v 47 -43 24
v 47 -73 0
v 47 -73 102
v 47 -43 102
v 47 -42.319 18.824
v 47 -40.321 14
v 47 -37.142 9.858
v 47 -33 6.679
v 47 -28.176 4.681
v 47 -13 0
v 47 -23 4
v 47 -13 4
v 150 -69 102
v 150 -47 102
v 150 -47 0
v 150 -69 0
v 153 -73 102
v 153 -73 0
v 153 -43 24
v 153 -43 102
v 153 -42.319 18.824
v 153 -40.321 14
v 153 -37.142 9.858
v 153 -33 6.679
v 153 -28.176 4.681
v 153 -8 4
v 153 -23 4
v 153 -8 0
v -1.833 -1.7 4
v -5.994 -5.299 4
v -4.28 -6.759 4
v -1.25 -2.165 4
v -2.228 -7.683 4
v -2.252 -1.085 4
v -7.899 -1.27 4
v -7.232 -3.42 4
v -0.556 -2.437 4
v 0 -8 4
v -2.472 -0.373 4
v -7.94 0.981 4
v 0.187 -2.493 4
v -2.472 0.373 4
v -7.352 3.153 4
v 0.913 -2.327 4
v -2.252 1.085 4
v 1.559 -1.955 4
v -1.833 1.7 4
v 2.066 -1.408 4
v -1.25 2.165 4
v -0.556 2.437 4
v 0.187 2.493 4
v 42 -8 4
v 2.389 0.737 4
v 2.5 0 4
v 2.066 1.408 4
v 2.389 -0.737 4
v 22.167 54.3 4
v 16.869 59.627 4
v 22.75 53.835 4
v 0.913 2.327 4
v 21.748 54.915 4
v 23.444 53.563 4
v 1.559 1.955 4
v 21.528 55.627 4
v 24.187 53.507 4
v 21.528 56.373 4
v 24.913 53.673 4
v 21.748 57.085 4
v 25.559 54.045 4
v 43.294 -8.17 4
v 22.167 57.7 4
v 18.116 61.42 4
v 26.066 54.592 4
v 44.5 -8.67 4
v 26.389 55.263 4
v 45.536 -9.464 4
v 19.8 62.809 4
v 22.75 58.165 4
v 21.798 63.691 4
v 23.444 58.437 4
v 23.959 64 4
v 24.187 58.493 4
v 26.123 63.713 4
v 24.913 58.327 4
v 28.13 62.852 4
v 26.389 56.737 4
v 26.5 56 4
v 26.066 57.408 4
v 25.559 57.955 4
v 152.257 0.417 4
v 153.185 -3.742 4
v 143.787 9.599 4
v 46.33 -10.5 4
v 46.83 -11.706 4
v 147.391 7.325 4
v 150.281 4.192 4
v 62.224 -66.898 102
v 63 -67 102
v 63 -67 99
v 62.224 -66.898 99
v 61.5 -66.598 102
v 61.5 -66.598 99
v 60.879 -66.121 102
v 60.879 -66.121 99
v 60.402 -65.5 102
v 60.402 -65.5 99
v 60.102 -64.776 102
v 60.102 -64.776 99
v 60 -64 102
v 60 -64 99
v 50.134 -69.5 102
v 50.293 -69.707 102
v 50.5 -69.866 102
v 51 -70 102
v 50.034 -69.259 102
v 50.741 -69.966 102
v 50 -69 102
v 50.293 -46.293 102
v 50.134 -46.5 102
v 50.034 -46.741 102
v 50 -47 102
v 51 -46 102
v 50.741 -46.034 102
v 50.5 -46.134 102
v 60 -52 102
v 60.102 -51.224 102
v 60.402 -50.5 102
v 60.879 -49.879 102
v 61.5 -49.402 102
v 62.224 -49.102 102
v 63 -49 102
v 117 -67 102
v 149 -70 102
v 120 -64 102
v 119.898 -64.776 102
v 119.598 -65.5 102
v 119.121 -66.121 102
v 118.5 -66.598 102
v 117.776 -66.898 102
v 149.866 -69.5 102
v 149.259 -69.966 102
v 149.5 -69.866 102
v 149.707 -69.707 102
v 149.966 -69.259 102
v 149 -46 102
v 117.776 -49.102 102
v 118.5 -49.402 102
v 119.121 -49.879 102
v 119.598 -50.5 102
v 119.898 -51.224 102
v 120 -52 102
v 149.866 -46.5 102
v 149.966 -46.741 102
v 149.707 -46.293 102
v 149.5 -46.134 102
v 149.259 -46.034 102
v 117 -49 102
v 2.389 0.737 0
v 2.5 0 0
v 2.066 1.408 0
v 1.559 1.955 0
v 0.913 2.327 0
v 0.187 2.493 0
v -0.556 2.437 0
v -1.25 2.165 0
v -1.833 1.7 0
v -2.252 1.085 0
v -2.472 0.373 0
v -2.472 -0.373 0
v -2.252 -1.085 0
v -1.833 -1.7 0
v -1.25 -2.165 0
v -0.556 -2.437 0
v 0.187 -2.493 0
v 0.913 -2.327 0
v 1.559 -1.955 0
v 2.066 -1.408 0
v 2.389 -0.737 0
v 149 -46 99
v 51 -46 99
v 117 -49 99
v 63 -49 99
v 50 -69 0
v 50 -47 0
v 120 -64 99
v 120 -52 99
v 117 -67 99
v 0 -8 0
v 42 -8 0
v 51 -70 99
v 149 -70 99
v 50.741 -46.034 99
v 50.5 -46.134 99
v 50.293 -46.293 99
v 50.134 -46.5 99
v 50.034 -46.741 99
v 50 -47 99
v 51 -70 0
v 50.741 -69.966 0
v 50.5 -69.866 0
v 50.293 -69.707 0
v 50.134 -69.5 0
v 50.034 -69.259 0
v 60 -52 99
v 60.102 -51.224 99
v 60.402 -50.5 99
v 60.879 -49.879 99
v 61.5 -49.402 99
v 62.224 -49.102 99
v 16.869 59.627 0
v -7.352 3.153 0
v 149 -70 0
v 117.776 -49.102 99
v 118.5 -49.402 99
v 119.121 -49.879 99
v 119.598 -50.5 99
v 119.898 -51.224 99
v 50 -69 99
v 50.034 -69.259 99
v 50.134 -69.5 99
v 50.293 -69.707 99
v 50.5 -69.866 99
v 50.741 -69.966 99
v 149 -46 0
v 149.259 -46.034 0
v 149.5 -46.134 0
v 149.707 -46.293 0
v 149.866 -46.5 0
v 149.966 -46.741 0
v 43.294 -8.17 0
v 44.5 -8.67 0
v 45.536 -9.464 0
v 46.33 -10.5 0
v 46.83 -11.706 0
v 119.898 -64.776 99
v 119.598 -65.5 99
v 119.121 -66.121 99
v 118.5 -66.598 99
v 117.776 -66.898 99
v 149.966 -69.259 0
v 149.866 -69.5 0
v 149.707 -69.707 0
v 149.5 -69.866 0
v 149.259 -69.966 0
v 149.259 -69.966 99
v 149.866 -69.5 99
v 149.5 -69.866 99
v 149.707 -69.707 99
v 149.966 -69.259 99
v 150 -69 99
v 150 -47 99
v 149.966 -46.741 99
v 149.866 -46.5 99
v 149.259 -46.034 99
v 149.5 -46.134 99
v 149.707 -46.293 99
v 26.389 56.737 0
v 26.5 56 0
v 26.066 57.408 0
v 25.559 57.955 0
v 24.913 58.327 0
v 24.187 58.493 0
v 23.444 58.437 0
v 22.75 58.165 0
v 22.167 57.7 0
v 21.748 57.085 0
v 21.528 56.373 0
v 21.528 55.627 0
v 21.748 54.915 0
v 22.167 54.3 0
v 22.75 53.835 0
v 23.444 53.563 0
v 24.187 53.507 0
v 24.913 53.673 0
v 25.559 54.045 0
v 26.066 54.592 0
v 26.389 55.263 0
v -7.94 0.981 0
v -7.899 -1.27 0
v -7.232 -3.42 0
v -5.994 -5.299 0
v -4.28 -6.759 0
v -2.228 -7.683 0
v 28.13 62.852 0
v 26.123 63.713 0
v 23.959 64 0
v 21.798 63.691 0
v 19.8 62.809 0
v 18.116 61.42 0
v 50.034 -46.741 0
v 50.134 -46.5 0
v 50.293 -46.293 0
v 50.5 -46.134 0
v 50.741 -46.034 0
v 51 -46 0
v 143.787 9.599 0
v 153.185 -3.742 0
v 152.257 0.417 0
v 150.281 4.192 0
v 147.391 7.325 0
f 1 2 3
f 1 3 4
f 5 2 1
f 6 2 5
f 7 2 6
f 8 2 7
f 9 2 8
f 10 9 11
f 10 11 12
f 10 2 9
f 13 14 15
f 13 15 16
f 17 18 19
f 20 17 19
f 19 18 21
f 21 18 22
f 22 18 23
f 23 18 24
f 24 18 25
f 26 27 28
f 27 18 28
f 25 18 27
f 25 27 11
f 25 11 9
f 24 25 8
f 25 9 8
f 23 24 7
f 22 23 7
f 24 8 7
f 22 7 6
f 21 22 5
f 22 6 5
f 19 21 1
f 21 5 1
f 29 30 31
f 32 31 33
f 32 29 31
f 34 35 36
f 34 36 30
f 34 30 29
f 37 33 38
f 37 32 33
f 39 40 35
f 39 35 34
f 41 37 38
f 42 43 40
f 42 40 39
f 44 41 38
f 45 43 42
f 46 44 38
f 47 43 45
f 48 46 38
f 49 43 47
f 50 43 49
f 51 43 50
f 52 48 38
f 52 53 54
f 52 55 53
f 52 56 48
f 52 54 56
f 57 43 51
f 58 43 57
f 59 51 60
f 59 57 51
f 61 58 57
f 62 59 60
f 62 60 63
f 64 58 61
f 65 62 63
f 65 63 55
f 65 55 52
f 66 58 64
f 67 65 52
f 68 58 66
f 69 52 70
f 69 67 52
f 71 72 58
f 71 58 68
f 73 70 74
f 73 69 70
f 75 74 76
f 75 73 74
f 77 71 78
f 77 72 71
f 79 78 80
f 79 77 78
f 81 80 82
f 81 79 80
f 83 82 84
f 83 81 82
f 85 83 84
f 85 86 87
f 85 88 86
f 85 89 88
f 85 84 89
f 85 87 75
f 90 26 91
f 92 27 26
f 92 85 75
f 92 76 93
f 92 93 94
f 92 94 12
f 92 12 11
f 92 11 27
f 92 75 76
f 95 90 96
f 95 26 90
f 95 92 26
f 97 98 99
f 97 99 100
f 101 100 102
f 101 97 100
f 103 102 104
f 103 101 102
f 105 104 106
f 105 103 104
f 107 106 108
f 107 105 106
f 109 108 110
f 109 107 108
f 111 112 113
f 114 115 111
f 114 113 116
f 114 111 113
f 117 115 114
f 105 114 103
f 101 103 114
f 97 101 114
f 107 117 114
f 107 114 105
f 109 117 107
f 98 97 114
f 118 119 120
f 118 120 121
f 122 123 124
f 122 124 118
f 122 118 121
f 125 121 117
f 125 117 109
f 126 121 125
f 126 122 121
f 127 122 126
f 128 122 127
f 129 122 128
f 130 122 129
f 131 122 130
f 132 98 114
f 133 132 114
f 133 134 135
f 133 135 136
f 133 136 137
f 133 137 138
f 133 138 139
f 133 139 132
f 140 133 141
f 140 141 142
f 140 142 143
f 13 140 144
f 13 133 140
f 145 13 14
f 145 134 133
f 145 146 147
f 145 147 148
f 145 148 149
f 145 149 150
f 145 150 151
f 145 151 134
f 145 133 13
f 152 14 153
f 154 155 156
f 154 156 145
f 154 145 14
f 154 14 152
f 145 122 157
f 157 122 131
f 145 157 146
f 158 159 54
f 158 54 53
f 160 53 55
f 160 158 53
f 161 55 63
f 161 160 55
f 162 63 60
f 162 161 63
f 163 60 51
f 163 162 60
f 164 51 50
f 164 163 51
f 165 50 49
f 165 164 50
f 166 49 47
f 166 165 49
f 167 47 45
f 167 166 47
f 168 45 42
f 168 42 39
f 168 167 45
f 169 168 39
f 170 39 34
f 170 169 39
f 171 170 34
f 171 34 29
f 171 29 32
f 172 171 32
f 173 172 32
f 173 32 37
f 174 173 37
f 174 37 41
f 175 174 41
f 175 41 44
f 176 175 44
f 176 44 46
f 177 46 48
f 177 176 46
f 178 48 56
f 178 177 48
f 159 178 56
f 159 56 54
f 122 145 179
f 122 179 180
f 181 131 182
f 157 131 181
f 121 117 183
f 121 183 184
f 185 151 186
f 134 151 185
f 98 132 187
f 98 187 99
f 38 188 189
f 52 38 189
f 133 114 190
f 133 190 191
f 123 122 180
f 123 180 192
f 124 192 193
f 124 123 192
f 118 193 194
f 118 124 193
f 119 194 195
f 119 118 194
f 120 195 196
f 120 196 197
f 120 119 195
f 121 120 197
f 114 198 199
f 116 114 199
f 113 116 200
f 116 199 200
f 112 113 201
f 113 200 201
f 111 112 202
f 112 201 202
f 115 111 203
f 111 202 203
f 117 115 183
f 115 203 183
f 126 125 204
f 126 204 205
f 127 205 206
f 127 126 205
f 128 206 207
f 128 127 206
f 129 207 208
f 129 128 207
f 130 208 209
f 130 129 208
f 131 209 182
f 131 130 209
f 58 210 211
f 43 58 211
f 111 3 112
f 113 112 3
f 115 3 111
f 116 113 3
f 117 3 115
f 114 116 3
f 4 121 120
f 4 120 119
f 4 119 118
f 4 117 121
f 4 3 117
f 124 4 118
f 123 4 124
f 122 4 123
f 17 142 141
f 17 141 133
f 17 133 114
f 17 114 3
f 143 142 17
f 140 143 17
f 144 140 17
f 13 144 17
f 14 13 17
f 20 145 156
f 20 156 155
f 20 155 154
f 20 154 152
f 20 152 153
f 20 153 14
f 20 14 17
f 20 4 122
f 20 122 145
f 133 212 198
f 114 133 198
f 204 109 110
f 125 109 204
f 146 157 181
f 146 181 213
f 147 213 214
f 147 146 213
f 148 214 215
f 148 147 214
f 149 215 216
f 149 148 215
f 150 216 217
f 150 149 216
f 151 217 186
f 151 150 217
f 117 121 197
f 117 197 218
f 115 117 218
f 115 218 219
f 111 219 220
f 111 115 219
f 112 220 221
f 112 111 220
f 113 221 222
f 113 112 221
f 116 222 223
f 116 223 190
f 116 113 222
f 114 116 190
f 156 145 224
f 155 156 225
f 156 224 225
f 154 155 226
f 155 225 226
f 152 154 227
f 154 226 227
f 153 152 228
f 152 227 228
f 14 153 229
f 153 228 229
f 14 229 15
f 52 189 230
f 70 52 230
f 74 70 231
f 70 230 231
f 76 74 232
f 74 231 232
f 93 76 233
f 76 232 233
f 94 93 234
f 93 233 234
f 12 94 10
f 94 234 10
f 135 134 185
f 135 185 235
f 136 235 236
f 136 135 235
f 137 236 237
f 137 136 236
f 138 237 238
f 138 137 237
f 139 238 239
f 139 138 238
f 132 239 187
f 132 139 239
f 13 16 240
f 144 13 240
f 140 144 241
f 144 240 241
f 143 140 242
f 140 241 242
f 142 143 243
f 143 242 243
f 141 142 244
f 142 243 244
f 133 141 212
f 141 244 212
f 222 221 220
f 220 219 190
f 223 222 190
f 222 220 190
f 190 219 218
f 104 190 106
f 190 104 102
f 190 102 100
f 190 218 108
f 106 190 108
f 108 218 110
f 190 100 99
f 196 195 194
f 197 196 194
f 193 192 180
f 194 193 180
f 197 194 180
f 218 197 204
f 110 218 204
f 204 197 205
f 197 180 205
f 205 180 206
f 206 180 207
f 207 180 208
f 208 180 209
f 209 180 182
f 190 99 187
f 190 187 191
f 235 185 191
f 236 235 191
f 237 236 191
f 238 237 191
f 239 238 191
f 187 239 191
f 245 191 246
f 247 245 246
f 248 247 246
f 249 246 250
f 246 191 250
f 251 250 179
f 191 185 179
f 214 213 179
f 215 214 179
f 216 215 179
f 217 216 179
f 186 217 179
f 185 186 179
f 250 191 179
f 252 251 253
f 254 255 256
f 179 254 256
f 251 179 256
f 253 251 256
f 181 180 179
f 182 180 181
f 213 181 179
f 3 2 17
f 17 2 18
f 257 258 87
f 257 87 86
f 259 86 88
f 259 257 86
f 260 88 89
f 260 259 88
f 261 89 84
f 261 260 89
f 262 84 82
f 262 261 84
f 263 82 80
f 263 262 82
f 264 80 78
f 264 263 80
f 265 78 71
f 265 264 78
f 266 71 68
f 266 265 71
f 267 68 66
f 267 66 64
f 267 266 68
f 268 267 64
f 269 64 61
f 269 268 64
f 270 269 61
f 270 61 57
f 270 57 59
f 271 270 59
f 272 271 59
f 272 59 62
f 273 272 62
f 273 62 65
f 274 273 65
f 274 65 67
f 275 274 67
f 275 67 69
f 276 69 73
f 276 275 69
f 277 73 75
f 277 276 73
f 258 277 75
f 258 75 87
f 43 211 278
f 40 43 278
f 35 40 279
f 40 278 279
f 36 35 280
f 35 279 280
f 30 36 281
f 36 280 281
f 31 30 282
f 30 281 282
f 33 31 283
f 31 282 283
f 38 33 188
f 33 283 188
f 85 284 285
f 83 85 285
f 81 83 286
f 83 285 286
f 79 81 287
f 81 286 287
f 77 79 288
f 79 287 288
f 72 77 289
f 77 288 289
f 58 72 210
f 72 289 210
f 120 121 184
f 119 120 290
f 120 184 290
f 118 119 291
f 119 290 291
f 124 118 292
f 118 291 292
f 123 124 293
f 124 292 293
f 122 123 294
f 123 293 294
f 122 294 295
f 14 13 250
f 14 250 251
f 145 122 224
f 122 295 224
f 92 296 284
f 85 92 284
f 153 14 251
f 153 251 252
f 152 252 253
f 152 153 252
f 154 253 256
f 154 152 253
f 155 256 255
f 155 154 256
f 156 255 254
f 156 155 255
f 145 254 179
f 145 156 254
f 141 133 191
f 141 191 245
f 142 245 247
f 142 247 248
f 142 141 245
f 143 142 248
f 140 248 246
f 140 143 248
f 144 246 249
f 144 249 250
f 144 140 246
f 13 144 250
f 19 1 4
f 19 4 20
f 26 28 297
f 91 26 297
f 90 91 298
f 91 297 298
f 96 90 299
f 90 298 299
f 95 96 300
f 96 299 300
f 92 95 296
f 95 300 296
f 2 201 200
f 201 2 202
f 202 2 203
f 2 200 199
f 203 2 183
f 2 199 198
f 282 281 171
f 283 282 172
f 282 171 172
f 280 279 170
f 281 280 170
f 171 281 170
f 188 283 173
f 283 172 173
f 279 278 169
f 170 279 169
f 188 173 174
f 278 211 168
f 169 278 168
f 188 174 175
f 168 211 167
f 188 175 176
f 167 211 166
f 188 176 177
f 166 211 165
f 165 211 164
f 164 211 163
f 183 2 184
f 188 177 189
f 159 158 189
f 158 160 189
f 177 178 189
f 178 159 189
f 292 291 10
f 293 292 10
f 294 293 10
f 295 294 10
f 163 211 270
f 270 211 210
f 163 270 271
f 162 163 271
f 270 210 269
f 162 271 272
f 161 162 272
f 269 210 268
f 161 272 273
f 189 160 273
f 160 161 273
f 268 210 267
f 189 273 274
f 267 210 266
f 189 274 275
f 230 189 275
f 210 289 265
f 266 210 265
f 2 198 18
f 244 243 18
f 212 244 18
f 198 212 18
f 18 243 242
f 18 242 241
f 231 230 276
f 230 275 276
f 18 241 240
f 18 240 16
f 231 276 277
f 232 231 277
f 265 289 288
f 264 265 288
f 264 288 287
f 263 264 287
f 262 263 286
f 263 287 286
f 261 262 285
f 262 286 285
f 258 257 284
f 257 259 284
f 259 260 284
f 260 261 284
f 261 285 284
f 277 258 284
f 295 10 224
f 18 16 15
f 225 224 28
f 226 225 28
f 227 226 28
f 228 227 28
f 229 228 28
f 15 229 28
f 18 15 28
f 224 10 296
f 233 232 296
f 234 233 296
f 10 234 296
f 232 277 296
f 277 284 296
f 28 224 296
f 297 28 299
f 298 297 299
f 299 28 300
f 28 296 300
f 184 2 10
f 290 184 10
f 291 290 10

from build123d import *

# Parameters (mm, degrees)
F0_R      = 2.5
F1_DEPTH  = 4
F3_DEPTH  = 4.001
F2_W      = 106
F2_H      = 30
F4_DEPTH  = 77
F4_FACE_W = 106
F4_FACE_H = 30
F5_DEPTH  = 25
F7_DEPTH  = 3
F8_R      = 20


with BuildPart() as f1:
    # F0 (on Top) → F1 (new body)
    with BuildSketch(Plane.XY):
        with BuildLine():
            Line((143.787086, 9.598864), (28.129779, 62.851637))
            ThreePointArc((28.129779, 62.851637), (21.797523, 63.690845), (16.869406, 59.62693))
            Line((16.869406, 59.62693), (-7.352276, 3.153416))
            ThreePointArc((-7.352276, 3.153416), (-6.679346, -4.402992), (0, -8))
            Line((0, -8), (42, -8))
            ThreePointArc((42, -8), (45.535534, -9.464466), (47, -13))
            Line((47, -13), (47, -73))
            Line((47, -73), (153, -73))
            Line((153, -73), (153, -8))
            ThreePointArc((153, -8), (151.392982, 2.369623), (143.787086, 9.598864))
        make_face()
        Circle(F0_R, mode=Mode.SUBTRACT)
        with Locations((24, 56)):
            Circle(F0_R, mode=Mode.SUBTRACT)
    extrude(amount=F1_DEPTH)

    # F2 (on face) → F3 (cut, through all)
    with BuildSketch(Plane(origin=(0, 0, 0), x_dir=(1, 0, 0), z_dir=(0, 0, -1))):
        with BuildLine():
            ThreePointArc((50, 47), (50.292893, 46.292893), (51, 46))
            Line((51, 46), (149, 46))
            ThreePointArc((149, 46), (149.707107, 46.292893), (150, 47))
            Line((150, 47), (150, 69))
            ThreePointArc((150, 69), (149.707107, 69.707107), (149, 70))
            Line((149, 70), (51, 70))
            ThreePointArc((51, 70), (50.292893, 69.707107), (50, 69))
            Line((50, 69), (50, 47))
        make_face()
    extrude(amount=-F3_DEPTH, mode=Mode.SUBTRACT)

    # F2 (on face) → F4 (join)
    with BuildSketch(Plane(origin=(0, 0, 0), x_dir=(1, 0, 0), z_dir=(0, 0, -1))):
        with Locations((100, 58)):
            Rectangle(F2_W, F2_H)
        with BuildLine():
            Line((149, 46), (51, 46))
            ThreePointArc((51, 46), (50.292893, 46.292893), (50, 47))
            Line((50, 47), (50, 69))
            ThreePointArc((50, 69), (50.292893, 69.707107), (51, 70))
            Line((51, 70), (149, 70))
            ThreePointArc((149, 70), (149.707107, 69.707107), (150, 69))
            Line((150, 69), (150, 47))
            ThreePointArc((150, 47), (149.707107, 46.292893), (149, 46))
        make_face(mode=Mode.SUBTRACT)
    extrude(amount=-F4_DEPTH)

    # F4_face (on face) → F5 (join)
    with BuildSketch(Plane(origin=(100, -58, 77), x_dir=(1, 0, 0), z_dir=(0, 0, 1))):
        Rectangle(F4_FACE_W, F4_FACE_H)
        with BuildLine():
            Line((-49, 12), (49, 12))
            ThreePointArc((49, 12), (49.707107, 11.707107), (50, 11))
            Line((50, 11), (50, -11))
            ThreePointArc((50, -11), (49.707107, -11.707107), (49, -12))
            Line((49, -12), (-49, -12))
            ThreePointArc((-49, -12), (-49.707107, -11.707107), (-50, -11))
            Line((-50, -11), (-50, 11))
            ThreePointArc((-50, 11), (-49.707107, 11.707107), (-49, 12))
        make_face(mode=Mode.SUBTRACT)
    extrude(amount=F5_DEPTH)

    # F8
    f8_edges = [f1.edges().sort_by_distance(p)[0] for p in [
        (100, -43, 4),
    ]]
    fillet(f8_edges, radius=F8_R)


with BuildPart() as f7:
    # F6 (on face) → F7 (new body)
    with BuildSketch(Plane.XY.offset(102)):
        with BuildLine():
            Line((149, -46), (51, -46))
            ThreePointArc((51, -46), (50.292893, -46.292893), (50, -47))
            Line((50, -47), (50, -69))
            ThreePointArc((50, -69), (50.292893, -69.707107), (51, -70))
            Line((51, -70), (149, -70))
            ThreePointArc((149, -70), (149.707107, -69.707107), (150, -69))
            Line((150, -69), (150, -47))
            ThreePointArc((150, -47), (149.707107, -46.292893), (149, -46))
        make_face()
        with BuildLine():
            Line((60, -64), (60, -52))
            ThreePointArc((60, -52), (60.87868, -49.87868), (63, -49))
            Line((63, -49), (117, -49))
            ThreePointArc((117, -49), (119.12132, -49.87868), (120, -52))
            Line((120, -52), (120, -64))
            ThreePointArc((120, -64), (119.12132, -66.12132), (117, -67))
            Line((117, -67), (63, -67))
            ThreePointArc((63, -67), (60.87868, -66.12132), (60, -64))
        make_face(mode=Mode.SUBTRACT)
    extrude(amount=-F7_DEPTH)


solid = Compound([f1.part, f7.part])
